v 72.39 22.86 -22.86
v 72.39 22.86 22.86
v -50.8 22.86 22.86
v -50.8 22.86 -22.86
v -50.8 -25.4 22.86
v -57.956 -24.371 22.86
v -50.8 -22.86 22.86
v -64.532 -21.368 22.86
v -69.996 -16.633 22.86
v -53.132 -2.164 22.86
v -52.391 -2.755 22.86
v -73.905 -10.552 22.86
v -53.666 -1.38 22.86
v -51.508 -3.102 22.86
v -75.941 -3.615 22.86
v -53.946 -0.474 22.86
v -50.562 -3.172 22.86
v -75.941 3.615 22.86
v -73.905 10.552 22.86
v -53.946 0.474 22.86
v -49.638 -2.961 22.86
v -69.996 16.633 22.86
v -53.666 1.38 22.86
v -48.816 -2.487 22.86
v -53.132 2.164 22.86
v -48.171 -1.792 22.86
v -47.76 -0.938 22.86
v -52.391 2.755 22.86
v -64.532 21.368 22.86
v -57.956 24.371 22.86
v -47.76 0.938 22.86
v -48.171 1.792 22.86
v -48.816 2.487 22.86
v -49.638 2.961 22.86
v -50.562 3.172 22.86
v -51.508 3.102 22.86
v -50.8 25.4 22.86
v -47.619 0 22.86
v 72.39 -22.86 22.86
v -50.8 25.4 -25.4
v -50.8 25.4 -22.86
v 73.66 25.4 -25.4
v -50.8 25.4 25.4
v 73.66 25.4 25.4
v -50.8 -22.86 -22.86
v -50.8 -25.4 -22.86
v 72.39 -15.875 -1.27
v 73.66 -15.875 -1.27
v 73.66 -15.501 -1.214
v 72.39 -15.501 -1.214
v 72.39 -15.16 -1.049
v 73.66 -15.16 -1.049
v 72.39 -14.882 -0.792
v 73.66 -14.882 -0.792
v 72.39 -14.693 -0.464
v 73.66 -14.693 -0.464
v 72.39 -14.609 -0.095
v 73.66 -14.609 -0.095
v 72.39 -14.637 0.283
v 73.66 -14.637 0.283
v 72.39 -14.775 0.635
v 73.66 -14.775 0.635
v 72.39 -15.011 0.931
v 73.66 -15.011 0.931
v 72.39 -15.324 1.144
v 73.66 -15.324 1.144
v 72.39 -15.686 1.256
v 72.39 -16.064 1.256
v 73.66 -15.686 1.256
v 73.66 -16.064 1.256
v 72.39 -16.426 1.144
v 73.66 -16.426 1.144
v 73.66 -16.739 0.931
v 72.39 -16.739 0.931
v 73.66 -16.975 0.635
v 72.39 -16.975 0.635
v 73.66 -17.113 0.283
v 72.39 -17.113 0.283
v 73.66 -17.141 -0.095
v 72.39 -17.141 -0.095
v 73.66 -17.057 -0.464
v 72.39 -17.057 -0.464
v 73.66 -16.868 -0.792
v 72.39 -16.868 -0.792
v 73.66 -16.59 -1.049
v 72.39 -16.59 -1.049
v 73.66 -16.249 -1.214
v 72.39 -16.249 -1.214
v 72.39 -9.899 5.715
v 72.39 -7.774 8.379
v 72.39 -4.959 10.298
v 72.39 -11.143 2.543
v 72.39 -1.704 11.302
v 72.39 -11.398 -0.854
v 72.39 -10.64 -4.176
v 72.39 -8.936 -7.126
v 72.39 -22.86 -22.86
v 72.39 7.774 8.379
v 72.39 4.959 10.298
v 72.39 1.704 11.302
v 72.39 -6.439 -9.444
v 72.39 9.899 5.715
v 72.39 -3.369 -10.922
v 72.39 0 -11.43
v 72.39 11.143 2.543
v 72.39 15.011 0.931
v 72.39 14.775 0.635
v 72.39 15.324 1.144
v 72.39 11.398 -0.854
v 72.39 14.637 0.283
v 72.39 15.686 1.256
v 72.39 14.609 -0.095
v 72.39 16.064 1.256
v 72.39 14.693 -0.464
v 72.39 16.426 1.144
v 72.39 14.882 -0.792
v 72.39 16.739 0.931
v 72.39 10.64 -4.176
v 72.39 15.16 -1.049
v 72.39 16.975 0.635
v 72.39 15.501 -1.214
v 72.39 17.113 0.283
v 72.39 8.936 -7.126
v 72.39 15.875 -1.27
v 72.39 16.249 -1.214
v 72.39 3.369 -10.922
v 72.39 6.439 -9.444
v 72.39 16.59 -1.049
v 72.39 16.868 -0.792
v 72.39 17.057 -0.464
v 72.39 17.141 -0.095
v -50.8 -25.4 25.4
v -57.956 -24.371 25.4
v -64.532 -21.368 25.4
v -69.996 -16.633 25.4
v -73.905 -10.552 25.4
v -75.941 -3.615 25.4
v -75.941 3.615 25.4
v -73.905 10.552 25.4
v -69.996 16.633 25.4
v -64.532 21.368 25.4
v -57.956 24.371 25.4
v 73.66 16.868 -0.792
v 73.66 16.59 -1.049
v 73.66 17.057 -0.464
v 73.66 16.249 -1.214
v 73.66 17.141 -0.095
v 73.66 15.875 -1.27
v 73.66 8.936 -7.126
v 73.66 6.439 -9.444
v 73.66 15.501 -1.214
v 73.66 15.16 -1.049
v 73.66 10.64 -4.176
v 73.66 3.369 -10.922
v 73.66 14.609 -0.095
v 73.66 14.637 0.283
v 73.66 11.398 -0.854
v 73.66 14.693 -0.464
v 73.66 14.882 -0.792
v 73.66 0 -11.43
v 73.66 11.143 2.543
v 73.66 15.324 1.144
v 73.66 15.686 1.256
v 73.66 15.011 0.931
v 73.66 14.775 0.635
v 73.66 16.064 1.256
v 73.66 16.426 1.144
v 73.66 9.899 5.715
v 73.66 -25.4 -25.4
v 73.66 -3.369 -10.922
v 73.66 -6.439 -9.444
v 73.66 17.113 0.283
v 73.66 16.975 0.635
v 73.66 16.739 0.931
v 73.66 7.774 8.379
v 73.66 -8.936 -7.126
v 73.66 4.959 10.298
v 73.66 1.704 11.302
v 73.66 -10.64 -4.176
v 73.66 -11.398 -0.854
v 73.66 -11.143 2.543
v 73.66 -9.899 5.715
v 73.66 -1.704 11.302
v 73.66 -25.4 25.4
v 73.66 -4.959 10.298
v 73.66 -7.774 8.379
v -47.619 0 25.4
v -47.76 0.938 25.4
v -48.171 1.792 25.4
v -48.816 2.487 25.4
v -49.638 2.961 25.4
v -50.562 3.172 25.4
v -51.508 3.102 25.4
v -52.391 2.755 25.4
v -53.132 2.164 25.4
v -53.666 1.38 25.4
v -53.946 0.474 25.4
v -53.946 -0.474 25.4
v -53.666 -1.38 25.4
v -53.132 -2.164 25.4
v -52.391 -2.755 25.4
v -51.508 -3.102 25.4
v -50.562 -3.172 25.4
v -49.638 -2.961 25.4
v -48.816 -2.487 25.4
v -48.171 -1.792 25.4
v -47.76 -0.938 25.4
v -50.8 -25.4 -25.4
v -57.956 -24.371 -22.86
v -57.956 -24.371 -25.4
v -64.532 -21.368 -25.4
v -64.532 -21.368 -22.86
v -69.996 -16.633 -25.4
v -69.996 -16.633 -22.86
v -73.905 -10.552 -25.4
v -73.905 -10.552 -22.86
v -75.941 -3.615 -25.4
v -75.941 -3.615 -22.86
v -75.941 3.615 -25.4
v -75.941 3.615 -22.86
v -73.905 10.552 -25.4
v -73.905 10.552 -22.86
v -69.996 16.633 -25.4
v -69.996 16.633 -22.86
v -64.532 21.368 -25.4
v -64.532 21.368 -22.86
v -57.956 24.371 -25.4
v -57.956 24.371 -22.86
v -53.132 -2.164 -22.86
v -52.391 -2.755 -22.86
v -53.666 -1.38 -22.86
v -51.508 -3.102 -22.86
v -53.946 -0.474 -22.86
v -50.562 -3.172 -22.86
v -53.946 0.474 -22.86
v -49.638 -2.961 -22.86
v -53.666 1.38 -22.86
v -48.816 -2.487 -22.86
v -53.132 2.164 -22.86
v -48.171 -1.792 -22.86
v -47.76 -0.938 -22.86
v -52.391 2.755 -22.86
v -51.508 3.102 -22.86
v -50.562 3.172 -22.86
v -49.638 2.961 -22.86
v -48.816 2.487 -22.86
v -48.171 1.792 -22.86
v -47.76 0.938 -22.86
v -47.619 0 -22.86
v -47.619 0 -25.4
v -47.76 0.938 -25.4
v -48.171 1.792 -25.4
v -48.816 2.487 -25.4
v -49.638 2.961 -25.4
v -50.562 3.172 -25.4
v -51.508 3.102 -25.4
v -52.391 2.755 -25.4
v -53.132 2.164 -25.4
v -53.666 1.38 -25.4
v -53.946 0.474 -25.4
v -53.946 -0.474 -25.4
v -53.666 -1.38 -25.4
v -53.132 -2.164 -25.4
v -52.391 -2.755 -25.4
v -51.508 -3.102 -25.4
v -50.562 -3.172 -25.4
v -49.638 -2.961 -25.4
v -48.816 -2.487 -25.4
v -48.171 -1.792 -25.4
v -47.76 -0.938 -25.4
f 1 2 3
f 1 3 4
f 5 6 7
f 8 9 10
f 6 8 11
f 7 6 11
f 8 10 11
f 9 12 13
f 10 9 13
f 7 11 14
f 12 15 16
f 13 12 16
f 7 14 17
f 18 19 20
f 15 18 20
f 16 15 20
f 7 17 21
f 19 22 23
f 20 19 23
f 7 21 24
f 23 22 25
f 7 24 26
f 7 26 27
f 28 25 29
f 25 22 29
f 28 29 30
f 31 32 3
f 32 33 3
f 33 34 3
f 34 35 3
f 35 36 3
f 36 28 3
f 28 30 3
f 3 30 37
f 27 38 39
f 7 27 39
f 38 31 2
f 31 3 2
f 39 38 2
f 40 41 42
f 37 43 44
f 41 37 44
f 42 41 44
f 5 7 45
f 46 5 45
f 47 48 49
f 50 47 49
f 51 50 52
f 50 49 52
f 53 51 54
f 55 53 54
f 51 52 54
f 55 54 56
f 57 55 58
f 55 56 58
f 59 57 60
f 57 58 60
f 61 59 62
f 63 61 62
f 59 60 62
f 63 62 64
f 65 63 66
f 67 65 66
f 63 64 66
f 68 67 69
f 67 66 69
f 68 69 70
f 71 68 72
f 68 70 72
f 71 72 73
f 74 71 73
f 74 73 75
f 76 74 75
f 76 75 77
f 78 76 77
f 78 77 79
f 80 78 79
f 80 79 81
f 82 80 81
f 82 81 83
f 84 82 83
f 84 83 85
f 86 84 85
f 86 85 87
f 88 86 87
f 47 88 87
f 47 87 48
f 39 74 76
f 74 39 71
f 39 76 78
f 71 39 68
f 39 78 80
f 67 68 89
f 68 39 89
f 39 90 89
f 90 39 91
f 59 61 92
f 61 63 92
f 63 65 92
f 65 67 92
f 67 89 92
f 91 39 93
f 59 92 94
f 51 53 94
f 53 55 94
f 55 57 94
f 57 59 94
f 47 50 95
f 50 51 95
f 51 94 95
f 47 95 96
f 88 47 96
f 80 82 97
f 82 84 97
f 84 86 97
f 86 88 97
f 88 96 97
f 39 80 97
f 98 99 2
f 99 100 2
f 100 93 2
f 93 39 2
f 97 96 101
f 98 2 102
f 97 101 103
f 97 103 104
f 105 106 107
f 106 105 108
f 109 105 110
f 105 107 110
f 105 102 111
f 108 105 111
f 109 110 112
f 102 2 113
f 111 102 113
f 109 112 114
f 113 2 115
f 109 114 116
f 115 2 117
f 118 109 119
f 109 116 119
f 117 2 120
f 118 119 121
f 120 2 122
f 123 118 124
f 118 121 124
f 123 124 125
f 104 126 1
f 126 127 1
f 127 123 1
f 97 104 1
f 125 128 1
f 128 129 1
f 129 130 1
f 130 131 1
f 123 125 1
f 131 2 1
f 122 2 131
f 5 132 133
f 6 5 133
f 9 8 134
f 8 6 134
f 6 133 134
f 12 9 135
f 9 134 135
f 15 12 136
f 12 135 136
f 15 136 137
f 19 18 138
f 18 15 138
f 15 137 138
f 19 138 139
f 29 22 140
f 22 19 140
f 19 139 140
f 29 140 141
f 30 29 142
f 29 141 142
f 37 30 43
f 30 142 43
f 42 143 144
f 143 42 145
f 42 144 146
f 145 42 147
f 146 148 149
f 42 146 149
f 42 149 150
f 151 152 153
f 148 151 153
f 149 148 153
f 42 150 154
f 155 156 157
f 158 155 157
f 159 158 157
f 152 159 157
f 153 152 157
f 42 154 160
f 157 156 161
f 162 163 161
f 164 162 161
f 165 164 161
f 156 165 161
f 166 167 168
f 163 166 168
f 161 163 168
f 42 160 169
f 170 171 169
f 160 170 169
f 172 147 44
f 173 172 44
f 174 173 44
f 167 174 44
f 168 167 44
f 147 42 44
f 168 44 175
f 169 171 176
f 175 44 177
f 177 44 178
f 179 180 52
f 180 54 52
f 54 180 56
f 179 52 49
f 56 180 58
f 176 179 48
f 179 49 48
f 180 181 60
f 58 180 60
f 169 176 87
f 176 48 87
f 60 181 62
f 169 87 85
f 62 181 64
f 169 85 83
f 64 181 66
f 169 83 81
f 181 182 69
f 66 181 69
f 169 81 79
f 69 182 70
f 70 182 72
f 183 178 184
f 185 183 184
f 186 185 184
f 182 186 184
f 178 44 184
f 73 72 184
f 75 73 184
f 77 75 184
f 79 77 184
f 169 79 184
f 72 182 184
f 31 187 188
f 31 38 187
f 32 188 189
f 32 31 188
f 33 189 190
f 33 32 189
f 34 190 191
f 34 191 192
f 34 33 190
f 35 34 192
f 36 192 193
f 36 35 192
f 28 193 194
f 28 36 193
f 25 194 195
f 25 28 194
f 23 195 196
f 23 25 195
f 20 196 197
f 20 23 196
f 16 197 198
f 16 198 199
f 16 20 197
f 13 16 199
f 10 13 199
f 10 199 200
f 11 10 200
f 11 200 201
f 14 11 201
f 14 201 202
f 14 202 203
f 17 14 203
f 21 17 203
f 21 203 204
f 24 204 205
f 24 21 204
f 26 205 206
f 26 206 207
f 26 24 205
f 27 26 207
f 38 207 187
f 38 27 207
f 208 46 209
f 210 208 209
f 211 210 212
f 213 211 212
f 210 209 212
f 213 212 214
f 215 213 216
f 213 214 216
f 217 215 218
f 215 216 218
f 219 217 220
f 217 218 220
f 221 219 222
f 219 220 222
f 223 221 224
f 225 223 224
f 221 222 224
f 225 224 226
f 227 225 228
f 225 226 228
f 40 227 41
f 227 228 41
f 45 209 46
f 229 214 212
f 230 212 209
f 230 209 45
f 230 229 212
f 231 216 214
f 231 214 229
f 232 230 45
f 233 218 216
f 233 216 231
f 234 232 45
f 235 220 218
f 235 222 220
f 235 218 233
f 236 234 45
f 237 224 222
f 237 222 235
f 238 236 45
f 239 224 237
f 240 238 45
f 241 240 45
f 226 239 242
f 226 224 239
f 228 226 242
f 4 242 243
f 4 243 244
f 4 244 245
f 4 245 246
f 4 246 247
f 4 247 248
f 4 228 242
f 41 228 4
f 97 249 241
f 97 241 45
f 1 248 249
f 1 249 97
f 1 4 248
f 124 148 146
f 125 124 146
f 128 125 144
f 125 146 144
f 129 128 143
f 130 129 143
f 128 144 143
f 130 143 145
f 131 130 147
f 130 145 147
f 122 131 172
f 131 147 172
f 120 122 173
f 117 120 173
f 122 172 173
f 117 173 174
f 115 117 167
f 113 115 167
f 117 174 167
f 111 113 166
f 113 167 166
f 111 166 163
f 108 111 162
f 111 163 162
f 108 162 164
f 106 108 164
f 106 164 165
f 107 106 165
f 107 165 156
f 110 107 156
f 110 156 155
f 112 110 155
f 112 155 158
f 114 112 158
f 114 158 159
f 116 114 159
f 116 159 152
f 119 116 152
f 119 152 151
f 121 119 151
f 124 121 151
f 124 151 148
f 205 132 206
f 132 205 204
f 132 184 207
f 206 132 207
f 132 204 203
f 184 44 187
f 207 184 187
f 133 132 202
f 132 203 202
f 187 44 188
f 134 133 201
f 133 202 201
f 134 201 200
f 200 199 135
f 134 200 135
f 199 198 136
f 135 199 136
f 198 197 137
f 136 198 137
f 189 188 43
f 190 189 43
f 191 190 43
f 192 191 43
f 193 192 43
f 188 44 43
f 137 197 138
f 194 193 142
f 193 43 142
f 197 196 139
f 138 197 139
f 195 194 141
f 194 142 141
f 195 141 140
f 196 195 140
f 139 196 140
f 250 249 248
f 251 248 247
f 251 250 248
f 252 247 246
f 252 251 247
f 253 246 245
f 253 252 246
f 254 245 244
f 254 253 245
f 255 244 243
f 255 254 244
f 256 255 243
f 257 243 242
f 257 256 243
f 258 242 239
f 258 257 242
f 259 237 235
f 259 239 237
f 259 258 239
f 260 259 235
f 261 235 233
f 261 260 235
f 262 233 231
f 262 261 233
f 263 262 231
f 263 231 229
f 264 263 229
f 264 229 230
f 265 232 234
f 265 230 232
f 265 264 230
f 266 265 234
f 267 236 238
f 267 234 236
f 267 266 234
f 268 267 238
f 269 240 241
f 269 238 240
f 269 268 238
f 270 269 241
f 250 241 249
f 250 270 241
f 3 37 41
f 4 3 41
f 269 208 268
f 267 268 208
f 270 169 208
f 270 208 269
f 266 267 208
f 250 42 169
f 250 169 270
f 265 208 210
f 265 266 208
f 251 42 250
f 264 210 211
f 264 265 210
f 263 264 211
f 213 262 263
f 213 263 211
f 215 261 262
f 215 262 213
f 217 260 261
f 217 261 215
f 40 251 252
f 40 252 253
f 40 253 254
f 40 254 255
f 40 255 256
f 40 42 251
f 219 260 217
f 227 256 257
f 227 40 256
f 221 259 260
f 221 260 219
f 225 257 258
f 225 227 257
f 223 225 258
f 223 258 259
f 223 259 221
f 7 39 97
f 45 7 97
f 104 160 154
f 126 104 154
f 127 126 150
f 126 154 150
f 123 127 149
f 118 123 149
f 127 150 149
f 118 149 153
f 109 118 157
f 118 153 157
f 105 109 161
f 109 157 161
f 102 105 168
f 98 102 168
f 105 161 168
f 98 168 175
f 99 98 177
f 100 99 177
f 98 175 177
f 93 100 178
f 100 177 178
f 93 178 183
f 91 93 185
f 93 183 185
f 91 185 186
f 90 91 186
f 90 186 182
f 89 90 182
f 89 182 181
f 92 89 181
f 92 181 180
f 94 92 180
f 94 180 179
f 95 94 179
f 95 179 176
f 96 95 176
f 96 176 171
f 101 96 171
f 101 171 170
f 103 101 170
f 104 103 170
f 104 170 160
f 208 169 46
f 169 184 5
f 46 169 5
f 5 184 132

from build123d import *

# Parameters (mm, degrees)
SKETCH2_R           = 3.18135
BOSS_EXTRUDE1_DEPTH = 25.4
SKETCH5_W           = 45.72
SKETCH5_H           = 45.72
CUT_EXTRUDE1_DEPTH  = 72.39
SKETCH6_W           = 45.72
SKETCH6_H           = 45.72
CUT_EXTRUDE2_DEPTH  = 83.82
CUT_EXTRUDE3_REACH  = 151.86
SKETCH8_R           = 11.43
SKETCH8_R_2         = 1.27


with BuildPart() as part:
    # Sketch2 → Boss-Extrude1 (new body, symmetric)
    with BuildSketch(Plane.XY):
        with BuildLine():
            Line((-50.8, 25.4), (73.66, 25.4))
            Line((73.66, 25.4), (73.66, -25.4))
            Line((73.66, -25.4), (-50.8, -25.4))
            ThreePointArc((-50.8, -25.4), (-76.2, 0), (-50.8, 25.4))
        make_face()
        with Locations((-50.8, 0)):
            Circle(SKETCH2_R, mode=Mode.SUBTRACT)
    extrude(amount=BOSS_EXTRUDE1_DEPTH, both=True)

    # Sketch5 → Cut-Extrude1 (cut, symmetric)
    with BuildSketch(Plane(origin=(0, 0, 0), x_dir=(0, 0, -1), z_dir=(1, 0, 0))):
        Rectangle(SKETCH5_W, SKETCH5_H)
    extrude(amount=CUT_EXTRUDE1_DEPTH, both=True, mode=Mode.SUBTRACT)

    # Sketch6 → Cut-Extrude2 (cut, symmetric)
    with BuildSketch(Plane(origin=(0, 0, 0), x_dir=(1, 0, 0), z_dir=(0, 1, 0))):
        with Locations((-73.66, 0)):
            Rectangle(SKETCH6_W, SKETCH6_H)
    extrude(amount=CUT_EXTRUDE2_DEPTH, both=True, mode=Mode.SUBTRACT)

    # Sketch8 → Cut-Extrude3 (cut, up to next)
    with BuildSketch(Plane(origin=(73.66, 0, 0), x_dir=(0, 0, -1), z_dir=(1, 0, 0)), mode=Mode.PRIVATE) as cut_extrude3_sk1:
        Circle(SKETCH8_R)
    cut_extrude3_tool1 = extrude(cut_extrude3_sk1.sketch, amount=-CUT_EXTRUDE3_REACH, mode=Mode.PRIVATE) & part.part
    add(cut_extrude3_tool1.solids().sort_by_distance((73.66, 0, 0))[0], mode=Mode.SUBTRACT)
    # Sketch8 → Cut-Extrude3 (cut, up to next)
    with BuildSketch(Plane(origin=(73.66, 0, 0), x_dir=(0, 0, -1), z_dir=(1, 0, 0)), mode=Mode.PRIVATE) as cut_extrude3_sk2:
        with Locations((0, 15.875)):
            Circle(SKETCH8_R_2)
    cut_extrude3_tool2 = extrude(cut_extrude3_sk2.sketch, amount=-CUT_EXTRUDE3_REACH, mode=Mode.PRIVATE) & part.part
    add(cut_extrude3_tool2.solids().sort_by_distance((73.66, 15.875, 0))[0], mode=Mode.SUBTRACT)
    # Sketch8 → Cut-Extrude3 (cut, up to next)
    with BuildSketch(Plane(origin=(73.66, 0, 0), x_dir=(0, 0, -1), z_dir=(1, 0, 0)), mode=Mode.PRIVATE) as cut_extrude3_sk3:
        with Locations((0, -15.875)):
            Circle(SKETCH8_R_2)
    cut_extrude3_tool3 = extrude(cut_extrude3_sk3.sketch, amount=-CUT_EXTRUDE3_REACH, mode=Mode.PRIVATE) & part.part
    add(cut_extrude3_tool3.solids().sort_by_distance((73.66, -15.875, 0))[0], mode=Mode.SUBTRACT)


solid = part.part
